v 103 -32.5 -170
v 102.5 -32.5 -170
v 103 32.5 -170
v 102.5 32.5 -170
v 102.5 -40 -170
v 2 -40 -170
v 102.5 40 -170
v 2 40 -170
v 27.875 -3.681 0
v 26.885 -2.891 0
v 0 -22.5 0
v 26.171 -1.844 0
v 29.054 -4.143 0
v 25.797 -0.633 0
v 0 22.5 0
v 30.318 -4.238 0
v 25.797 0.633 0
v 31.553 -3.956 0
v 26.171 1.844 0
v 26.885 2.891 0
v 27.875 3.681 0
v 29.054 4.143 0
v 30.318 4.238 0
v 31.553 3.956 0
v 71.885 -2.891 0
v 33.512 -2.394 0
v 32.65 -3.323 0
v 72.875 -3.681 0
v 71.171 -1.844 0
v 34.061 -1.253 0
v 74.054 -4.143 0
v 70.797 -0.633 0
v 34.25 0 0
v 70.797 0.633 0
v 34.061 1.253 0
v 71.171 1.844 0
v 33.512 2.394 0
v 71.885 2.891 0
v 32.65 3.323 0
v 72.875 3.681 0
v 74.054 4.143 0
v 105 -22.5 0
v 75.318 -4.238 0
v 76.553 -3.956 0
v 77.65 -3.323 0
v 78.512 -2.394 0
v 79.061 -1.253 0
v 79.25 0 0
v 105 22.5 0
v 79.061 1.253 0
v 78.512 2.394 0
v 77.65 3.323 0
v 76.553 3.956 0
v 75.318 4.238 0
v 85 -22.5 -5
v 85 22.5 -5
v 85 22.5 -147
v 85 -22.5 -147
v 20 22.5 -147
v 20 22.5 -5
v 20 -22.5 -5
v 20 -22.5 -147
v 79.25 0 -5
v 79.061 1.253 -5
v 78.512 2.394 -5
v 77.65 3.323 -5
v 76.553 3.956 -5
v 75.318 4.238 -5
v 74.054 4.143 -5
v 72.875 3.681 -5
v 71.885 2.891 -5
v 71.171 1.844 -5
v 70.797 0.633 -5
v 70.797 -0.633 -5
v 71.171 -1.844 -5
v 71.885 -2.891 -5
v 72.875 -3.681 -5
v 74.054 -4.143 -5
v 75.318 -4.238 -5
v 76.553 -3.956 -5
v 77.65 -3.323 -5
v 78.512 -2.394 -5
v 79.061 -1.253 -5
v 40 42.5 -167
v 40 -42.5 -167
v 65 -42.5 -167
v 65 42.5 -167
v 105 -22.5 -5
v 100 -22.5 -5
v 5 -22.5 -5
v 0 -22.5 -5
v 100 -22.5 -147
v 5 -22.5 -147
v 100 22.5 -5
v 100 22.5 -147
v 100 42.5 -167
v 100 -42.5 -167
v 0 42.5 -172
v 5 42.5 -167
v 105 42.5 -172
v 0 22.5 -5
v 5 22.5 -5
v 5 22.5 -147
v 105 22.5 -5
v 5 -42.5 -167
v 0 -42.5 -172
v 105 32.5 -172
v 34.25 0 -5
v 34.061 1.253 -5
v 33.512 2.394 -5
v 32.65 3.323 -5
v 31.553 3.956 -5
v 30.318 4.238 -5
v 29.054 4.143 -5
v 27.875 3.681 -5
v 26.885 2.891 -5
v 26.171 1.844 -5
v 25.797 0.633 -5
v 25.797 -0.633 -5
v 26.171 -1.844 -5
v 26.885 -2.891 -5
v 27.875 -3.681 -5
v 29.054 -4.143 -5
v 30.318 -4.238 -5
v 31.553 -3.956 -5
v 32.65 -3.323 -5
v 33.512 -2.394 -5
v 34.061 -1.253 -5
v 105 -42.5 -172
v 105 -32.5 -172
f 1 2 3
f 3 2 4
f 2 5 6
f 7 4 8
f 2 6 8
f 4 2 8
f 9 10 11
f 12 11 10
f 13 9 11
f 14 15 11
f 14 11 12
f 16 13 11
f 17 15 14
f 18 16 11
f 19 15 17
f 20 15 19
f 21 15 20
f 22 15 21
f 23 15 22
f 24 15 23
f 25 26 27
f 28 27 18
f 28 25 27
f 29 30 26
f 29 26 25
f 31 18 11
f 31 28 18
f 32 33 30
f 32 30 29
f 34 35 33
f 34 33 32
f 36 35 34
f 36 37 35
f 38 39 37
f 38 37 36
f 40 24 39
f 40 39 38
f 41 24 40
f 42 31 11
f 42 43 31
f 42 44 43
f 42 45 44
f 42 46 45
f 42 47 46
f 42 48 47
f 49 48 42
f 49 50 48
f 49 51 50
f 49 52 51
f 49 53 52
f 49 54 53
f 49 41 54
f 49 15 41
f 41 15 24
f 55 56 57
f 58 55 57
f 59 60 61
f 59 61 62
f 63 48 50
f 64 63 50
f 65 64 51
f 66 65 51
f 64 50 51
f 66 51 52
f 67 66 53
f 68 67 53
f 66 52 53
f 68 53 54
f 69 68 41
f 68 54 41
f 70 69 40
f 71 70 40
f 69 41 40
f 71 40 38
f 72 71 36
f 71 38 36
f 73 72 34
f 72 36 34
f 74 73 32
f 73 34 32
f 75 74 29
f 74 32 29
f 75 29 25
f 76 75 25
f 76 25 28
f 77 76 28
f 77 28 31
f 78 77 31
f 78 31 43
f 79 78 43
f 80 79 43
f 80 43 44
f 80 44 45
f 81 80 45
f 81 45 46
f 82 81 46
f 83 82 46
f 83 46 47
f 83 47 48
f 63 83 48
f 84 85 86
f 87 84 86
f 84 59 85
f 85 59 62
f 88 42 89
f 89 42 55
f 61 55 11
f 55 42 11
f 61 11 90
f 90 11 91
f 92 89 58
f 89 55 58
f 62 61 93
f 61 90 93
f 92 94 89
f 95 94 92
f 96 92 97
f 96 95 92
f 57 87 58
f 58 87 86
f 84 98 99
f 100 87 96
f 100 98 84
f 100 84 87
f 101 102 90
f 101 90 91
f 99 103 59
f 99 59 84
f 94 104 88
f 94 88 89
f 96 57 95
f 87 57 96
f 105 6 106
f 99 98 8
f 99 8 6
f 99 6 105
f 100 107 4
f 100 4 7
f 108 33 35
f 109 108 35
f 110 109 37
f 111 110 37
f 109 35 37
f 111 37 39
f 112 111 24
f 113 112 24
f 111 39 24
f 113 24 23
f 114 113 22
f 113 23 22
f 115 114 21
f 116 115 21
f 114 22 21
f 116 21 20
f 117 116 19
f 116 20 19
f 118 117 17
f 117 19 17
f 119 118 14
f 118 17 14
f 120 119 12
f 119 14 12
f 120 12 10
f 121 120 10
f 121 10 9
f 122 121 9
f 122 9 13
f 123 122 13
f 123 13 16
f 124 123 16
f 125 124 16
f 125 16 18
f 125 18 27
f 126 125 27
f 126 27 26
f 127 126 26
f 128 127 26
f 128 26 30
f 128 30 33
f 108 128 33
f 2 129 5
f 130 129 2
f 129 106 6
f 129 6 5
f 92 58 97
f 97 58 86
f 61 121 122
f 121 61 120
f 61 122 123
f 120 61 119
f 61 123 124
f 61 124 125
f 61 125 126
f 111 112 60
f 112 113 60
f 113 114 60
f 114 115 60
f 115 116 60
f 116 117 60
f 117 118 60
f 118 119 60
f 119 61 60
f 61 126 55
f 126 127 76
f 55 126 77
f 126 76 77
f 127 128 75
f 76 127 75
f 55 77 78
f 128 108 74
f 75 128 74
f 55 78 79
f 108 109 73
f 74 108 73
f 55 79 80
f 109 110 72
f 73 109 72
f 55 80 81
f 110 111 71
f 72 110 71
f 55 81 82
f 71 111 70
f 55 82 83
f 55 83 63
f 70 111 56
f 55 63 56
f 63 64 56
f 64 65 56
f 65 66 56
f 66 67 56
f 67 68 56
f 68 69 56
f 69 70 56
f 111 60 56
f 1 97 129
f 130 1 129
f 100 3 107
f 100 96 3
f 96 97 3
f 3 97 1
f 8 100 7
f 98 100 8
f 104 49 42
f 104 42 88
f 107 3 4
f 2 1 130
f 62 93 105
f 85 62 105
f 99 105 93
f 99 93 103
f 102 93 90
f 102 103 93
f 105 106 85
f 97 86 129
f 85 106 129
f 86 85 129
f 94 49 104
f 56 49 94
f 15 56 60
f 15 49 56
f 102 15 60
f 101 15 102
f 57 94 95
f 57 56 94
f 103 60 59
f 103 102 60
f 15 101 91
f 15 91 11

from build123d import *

# Parameters (mm, degrees)
SKETCH1_W           = 65
SKETCH1_H           = 162
BOSS_EXTRUDE1_DEPTH = 42.5
CUT_EXTRUDE1_DEPTH  = 206.949629764
CUT_EXTRUDE2_REACH  = 207.95
SKETCH4_R           = 4.25
SKETCH5_W           = 2
SKETCH5_H           = 65
CUT_EXTRUDE3_DEPTH  = 206.949629919
CHAMFER1_SIZE       = 20


with BuildPart() as part:
    # Sketch1 → Boss-Extrude1 (new, symmetric)
    with BuildSketch(Plane(origin=(0, 0, 0), x_dir=(1, 0, 0), z_dir=(0, 1, 0))):
        Polygon((100, 5), (100, 167), (105, 172), (0, 172), (5, 167), (5, 5), (0, 5), (0, 0), (105, 0), (105, 5), align=None)
        with Locations((52.5, 86)):
            Rectangle(SKETCH1_W, SKETCH1_H, mode=Mode.SUBTRACT)
    extrude(amount=BOSS_EXTRUDE1_DEPTH, both=True)

    # Sketch2 → Cut-Extrude1 (cut, through all)
    with BuildSketch(Plane(origin=(0, 0, 0), x_dir=(0, 0, -1), z_dir=(1, 0, 0))):
        Polygon((0, 22.5), (147, 22.5), (167, 42.5), (0, 42.5), align=None)
    cut_extrude1 = extrude(amount=CUT_EXTRUDE1_DEPTH, mode=Mode.SUBTRACT)

    # Mirror1: Cut-Extrude1 across plane
    add(cut_extrude1.mirror(Plane.ZX), mode=Mode.SUBTRACT)

    # Sketch3 → section 0 of cut_loft1
    with BuildSketch(Plane(origin=(0, 0, -170), x_dir=(-1, 0, 0), z_dir=(0, 0, -1)), mode=Mode.PRIVATE) as cut_loft1_s0:
        with BuildLine():
            Line((-102.5, 40), (0, 40))
            Line((0, 40), (0, -40))
            Line((0, -40), (-102.5, -40))
            Line((-102.5, -40), (-102.5, 40))
        make_face()
    # loft up to a face of the part (cut_loft1)
    loft([cut_loft1_s0.sketch, part.faces().sort_by_distance((52.5, 0, -172))[0]], mode=Mode.SUBTRACT)

    # Sketch4 → Cut-Extrude2 (cut, up to next)
    with BuildSketch(Plane.XY, mode=Mode.PRIVATE) as cut_extrude2_sk1:
        with Locations((30, 0)):
            Circle(SKETCH4_R)
    cut_extrude2_tool1 = extrude(cut_extrude2_sk1.sketch, amount=-CUT_EXTRUDE2_REACH, mode=Mode.PRIVATE) & part.part
    # Sketch4 → Cut-Extrude2 (cut, up to next)
    with BuildSketch(Plane.XY, mode=Mode.PRIVATE) as cut_extrude2_sk2:
        with Locations((75, 0)):
            Circle(SKETCH4_R)
    cut_extrude2_tool2 = extrude(cut_extrude2_sk2.sketch, amount=-CUT_EXTRUDE2_REACH, mode=Mode.PRIVATE) & part.part
    add(cut_extrude2_tool1.solids().sort_by_distance((30, 0, 0))[0], mode=Mode.SUBTRACT)
    add(cut_extrude2_tool2.solids().sort_by_distance((75, 0, 0))[0], mode=Mode.SUBTRACT)

    # Sketch5 → Cut-Extrude3 (cut, through all)
    with BuildSketch(Plane(origin=(0, 0, 0), x_dir=(0, 0, -1), z_dir=(1, 0, 0))):
        with Locations((171, 0)):
            Rectangle(SKETCH5_W, SKETCH5_H)
    extrude(amount=CUT_EXTRUDE3_DEPTH, mode=Mode.SUBTRACT)

    # Chamfer1
    chamfer1_edges = [part.edges().sort_by_distance(p)[0] for p in [
        (85, 0, -167),
        (20, 0, -167),
    ]]
    chamfer(chamfer1_edges, length=CHAMFER1_SIZE)


solid = part.part
